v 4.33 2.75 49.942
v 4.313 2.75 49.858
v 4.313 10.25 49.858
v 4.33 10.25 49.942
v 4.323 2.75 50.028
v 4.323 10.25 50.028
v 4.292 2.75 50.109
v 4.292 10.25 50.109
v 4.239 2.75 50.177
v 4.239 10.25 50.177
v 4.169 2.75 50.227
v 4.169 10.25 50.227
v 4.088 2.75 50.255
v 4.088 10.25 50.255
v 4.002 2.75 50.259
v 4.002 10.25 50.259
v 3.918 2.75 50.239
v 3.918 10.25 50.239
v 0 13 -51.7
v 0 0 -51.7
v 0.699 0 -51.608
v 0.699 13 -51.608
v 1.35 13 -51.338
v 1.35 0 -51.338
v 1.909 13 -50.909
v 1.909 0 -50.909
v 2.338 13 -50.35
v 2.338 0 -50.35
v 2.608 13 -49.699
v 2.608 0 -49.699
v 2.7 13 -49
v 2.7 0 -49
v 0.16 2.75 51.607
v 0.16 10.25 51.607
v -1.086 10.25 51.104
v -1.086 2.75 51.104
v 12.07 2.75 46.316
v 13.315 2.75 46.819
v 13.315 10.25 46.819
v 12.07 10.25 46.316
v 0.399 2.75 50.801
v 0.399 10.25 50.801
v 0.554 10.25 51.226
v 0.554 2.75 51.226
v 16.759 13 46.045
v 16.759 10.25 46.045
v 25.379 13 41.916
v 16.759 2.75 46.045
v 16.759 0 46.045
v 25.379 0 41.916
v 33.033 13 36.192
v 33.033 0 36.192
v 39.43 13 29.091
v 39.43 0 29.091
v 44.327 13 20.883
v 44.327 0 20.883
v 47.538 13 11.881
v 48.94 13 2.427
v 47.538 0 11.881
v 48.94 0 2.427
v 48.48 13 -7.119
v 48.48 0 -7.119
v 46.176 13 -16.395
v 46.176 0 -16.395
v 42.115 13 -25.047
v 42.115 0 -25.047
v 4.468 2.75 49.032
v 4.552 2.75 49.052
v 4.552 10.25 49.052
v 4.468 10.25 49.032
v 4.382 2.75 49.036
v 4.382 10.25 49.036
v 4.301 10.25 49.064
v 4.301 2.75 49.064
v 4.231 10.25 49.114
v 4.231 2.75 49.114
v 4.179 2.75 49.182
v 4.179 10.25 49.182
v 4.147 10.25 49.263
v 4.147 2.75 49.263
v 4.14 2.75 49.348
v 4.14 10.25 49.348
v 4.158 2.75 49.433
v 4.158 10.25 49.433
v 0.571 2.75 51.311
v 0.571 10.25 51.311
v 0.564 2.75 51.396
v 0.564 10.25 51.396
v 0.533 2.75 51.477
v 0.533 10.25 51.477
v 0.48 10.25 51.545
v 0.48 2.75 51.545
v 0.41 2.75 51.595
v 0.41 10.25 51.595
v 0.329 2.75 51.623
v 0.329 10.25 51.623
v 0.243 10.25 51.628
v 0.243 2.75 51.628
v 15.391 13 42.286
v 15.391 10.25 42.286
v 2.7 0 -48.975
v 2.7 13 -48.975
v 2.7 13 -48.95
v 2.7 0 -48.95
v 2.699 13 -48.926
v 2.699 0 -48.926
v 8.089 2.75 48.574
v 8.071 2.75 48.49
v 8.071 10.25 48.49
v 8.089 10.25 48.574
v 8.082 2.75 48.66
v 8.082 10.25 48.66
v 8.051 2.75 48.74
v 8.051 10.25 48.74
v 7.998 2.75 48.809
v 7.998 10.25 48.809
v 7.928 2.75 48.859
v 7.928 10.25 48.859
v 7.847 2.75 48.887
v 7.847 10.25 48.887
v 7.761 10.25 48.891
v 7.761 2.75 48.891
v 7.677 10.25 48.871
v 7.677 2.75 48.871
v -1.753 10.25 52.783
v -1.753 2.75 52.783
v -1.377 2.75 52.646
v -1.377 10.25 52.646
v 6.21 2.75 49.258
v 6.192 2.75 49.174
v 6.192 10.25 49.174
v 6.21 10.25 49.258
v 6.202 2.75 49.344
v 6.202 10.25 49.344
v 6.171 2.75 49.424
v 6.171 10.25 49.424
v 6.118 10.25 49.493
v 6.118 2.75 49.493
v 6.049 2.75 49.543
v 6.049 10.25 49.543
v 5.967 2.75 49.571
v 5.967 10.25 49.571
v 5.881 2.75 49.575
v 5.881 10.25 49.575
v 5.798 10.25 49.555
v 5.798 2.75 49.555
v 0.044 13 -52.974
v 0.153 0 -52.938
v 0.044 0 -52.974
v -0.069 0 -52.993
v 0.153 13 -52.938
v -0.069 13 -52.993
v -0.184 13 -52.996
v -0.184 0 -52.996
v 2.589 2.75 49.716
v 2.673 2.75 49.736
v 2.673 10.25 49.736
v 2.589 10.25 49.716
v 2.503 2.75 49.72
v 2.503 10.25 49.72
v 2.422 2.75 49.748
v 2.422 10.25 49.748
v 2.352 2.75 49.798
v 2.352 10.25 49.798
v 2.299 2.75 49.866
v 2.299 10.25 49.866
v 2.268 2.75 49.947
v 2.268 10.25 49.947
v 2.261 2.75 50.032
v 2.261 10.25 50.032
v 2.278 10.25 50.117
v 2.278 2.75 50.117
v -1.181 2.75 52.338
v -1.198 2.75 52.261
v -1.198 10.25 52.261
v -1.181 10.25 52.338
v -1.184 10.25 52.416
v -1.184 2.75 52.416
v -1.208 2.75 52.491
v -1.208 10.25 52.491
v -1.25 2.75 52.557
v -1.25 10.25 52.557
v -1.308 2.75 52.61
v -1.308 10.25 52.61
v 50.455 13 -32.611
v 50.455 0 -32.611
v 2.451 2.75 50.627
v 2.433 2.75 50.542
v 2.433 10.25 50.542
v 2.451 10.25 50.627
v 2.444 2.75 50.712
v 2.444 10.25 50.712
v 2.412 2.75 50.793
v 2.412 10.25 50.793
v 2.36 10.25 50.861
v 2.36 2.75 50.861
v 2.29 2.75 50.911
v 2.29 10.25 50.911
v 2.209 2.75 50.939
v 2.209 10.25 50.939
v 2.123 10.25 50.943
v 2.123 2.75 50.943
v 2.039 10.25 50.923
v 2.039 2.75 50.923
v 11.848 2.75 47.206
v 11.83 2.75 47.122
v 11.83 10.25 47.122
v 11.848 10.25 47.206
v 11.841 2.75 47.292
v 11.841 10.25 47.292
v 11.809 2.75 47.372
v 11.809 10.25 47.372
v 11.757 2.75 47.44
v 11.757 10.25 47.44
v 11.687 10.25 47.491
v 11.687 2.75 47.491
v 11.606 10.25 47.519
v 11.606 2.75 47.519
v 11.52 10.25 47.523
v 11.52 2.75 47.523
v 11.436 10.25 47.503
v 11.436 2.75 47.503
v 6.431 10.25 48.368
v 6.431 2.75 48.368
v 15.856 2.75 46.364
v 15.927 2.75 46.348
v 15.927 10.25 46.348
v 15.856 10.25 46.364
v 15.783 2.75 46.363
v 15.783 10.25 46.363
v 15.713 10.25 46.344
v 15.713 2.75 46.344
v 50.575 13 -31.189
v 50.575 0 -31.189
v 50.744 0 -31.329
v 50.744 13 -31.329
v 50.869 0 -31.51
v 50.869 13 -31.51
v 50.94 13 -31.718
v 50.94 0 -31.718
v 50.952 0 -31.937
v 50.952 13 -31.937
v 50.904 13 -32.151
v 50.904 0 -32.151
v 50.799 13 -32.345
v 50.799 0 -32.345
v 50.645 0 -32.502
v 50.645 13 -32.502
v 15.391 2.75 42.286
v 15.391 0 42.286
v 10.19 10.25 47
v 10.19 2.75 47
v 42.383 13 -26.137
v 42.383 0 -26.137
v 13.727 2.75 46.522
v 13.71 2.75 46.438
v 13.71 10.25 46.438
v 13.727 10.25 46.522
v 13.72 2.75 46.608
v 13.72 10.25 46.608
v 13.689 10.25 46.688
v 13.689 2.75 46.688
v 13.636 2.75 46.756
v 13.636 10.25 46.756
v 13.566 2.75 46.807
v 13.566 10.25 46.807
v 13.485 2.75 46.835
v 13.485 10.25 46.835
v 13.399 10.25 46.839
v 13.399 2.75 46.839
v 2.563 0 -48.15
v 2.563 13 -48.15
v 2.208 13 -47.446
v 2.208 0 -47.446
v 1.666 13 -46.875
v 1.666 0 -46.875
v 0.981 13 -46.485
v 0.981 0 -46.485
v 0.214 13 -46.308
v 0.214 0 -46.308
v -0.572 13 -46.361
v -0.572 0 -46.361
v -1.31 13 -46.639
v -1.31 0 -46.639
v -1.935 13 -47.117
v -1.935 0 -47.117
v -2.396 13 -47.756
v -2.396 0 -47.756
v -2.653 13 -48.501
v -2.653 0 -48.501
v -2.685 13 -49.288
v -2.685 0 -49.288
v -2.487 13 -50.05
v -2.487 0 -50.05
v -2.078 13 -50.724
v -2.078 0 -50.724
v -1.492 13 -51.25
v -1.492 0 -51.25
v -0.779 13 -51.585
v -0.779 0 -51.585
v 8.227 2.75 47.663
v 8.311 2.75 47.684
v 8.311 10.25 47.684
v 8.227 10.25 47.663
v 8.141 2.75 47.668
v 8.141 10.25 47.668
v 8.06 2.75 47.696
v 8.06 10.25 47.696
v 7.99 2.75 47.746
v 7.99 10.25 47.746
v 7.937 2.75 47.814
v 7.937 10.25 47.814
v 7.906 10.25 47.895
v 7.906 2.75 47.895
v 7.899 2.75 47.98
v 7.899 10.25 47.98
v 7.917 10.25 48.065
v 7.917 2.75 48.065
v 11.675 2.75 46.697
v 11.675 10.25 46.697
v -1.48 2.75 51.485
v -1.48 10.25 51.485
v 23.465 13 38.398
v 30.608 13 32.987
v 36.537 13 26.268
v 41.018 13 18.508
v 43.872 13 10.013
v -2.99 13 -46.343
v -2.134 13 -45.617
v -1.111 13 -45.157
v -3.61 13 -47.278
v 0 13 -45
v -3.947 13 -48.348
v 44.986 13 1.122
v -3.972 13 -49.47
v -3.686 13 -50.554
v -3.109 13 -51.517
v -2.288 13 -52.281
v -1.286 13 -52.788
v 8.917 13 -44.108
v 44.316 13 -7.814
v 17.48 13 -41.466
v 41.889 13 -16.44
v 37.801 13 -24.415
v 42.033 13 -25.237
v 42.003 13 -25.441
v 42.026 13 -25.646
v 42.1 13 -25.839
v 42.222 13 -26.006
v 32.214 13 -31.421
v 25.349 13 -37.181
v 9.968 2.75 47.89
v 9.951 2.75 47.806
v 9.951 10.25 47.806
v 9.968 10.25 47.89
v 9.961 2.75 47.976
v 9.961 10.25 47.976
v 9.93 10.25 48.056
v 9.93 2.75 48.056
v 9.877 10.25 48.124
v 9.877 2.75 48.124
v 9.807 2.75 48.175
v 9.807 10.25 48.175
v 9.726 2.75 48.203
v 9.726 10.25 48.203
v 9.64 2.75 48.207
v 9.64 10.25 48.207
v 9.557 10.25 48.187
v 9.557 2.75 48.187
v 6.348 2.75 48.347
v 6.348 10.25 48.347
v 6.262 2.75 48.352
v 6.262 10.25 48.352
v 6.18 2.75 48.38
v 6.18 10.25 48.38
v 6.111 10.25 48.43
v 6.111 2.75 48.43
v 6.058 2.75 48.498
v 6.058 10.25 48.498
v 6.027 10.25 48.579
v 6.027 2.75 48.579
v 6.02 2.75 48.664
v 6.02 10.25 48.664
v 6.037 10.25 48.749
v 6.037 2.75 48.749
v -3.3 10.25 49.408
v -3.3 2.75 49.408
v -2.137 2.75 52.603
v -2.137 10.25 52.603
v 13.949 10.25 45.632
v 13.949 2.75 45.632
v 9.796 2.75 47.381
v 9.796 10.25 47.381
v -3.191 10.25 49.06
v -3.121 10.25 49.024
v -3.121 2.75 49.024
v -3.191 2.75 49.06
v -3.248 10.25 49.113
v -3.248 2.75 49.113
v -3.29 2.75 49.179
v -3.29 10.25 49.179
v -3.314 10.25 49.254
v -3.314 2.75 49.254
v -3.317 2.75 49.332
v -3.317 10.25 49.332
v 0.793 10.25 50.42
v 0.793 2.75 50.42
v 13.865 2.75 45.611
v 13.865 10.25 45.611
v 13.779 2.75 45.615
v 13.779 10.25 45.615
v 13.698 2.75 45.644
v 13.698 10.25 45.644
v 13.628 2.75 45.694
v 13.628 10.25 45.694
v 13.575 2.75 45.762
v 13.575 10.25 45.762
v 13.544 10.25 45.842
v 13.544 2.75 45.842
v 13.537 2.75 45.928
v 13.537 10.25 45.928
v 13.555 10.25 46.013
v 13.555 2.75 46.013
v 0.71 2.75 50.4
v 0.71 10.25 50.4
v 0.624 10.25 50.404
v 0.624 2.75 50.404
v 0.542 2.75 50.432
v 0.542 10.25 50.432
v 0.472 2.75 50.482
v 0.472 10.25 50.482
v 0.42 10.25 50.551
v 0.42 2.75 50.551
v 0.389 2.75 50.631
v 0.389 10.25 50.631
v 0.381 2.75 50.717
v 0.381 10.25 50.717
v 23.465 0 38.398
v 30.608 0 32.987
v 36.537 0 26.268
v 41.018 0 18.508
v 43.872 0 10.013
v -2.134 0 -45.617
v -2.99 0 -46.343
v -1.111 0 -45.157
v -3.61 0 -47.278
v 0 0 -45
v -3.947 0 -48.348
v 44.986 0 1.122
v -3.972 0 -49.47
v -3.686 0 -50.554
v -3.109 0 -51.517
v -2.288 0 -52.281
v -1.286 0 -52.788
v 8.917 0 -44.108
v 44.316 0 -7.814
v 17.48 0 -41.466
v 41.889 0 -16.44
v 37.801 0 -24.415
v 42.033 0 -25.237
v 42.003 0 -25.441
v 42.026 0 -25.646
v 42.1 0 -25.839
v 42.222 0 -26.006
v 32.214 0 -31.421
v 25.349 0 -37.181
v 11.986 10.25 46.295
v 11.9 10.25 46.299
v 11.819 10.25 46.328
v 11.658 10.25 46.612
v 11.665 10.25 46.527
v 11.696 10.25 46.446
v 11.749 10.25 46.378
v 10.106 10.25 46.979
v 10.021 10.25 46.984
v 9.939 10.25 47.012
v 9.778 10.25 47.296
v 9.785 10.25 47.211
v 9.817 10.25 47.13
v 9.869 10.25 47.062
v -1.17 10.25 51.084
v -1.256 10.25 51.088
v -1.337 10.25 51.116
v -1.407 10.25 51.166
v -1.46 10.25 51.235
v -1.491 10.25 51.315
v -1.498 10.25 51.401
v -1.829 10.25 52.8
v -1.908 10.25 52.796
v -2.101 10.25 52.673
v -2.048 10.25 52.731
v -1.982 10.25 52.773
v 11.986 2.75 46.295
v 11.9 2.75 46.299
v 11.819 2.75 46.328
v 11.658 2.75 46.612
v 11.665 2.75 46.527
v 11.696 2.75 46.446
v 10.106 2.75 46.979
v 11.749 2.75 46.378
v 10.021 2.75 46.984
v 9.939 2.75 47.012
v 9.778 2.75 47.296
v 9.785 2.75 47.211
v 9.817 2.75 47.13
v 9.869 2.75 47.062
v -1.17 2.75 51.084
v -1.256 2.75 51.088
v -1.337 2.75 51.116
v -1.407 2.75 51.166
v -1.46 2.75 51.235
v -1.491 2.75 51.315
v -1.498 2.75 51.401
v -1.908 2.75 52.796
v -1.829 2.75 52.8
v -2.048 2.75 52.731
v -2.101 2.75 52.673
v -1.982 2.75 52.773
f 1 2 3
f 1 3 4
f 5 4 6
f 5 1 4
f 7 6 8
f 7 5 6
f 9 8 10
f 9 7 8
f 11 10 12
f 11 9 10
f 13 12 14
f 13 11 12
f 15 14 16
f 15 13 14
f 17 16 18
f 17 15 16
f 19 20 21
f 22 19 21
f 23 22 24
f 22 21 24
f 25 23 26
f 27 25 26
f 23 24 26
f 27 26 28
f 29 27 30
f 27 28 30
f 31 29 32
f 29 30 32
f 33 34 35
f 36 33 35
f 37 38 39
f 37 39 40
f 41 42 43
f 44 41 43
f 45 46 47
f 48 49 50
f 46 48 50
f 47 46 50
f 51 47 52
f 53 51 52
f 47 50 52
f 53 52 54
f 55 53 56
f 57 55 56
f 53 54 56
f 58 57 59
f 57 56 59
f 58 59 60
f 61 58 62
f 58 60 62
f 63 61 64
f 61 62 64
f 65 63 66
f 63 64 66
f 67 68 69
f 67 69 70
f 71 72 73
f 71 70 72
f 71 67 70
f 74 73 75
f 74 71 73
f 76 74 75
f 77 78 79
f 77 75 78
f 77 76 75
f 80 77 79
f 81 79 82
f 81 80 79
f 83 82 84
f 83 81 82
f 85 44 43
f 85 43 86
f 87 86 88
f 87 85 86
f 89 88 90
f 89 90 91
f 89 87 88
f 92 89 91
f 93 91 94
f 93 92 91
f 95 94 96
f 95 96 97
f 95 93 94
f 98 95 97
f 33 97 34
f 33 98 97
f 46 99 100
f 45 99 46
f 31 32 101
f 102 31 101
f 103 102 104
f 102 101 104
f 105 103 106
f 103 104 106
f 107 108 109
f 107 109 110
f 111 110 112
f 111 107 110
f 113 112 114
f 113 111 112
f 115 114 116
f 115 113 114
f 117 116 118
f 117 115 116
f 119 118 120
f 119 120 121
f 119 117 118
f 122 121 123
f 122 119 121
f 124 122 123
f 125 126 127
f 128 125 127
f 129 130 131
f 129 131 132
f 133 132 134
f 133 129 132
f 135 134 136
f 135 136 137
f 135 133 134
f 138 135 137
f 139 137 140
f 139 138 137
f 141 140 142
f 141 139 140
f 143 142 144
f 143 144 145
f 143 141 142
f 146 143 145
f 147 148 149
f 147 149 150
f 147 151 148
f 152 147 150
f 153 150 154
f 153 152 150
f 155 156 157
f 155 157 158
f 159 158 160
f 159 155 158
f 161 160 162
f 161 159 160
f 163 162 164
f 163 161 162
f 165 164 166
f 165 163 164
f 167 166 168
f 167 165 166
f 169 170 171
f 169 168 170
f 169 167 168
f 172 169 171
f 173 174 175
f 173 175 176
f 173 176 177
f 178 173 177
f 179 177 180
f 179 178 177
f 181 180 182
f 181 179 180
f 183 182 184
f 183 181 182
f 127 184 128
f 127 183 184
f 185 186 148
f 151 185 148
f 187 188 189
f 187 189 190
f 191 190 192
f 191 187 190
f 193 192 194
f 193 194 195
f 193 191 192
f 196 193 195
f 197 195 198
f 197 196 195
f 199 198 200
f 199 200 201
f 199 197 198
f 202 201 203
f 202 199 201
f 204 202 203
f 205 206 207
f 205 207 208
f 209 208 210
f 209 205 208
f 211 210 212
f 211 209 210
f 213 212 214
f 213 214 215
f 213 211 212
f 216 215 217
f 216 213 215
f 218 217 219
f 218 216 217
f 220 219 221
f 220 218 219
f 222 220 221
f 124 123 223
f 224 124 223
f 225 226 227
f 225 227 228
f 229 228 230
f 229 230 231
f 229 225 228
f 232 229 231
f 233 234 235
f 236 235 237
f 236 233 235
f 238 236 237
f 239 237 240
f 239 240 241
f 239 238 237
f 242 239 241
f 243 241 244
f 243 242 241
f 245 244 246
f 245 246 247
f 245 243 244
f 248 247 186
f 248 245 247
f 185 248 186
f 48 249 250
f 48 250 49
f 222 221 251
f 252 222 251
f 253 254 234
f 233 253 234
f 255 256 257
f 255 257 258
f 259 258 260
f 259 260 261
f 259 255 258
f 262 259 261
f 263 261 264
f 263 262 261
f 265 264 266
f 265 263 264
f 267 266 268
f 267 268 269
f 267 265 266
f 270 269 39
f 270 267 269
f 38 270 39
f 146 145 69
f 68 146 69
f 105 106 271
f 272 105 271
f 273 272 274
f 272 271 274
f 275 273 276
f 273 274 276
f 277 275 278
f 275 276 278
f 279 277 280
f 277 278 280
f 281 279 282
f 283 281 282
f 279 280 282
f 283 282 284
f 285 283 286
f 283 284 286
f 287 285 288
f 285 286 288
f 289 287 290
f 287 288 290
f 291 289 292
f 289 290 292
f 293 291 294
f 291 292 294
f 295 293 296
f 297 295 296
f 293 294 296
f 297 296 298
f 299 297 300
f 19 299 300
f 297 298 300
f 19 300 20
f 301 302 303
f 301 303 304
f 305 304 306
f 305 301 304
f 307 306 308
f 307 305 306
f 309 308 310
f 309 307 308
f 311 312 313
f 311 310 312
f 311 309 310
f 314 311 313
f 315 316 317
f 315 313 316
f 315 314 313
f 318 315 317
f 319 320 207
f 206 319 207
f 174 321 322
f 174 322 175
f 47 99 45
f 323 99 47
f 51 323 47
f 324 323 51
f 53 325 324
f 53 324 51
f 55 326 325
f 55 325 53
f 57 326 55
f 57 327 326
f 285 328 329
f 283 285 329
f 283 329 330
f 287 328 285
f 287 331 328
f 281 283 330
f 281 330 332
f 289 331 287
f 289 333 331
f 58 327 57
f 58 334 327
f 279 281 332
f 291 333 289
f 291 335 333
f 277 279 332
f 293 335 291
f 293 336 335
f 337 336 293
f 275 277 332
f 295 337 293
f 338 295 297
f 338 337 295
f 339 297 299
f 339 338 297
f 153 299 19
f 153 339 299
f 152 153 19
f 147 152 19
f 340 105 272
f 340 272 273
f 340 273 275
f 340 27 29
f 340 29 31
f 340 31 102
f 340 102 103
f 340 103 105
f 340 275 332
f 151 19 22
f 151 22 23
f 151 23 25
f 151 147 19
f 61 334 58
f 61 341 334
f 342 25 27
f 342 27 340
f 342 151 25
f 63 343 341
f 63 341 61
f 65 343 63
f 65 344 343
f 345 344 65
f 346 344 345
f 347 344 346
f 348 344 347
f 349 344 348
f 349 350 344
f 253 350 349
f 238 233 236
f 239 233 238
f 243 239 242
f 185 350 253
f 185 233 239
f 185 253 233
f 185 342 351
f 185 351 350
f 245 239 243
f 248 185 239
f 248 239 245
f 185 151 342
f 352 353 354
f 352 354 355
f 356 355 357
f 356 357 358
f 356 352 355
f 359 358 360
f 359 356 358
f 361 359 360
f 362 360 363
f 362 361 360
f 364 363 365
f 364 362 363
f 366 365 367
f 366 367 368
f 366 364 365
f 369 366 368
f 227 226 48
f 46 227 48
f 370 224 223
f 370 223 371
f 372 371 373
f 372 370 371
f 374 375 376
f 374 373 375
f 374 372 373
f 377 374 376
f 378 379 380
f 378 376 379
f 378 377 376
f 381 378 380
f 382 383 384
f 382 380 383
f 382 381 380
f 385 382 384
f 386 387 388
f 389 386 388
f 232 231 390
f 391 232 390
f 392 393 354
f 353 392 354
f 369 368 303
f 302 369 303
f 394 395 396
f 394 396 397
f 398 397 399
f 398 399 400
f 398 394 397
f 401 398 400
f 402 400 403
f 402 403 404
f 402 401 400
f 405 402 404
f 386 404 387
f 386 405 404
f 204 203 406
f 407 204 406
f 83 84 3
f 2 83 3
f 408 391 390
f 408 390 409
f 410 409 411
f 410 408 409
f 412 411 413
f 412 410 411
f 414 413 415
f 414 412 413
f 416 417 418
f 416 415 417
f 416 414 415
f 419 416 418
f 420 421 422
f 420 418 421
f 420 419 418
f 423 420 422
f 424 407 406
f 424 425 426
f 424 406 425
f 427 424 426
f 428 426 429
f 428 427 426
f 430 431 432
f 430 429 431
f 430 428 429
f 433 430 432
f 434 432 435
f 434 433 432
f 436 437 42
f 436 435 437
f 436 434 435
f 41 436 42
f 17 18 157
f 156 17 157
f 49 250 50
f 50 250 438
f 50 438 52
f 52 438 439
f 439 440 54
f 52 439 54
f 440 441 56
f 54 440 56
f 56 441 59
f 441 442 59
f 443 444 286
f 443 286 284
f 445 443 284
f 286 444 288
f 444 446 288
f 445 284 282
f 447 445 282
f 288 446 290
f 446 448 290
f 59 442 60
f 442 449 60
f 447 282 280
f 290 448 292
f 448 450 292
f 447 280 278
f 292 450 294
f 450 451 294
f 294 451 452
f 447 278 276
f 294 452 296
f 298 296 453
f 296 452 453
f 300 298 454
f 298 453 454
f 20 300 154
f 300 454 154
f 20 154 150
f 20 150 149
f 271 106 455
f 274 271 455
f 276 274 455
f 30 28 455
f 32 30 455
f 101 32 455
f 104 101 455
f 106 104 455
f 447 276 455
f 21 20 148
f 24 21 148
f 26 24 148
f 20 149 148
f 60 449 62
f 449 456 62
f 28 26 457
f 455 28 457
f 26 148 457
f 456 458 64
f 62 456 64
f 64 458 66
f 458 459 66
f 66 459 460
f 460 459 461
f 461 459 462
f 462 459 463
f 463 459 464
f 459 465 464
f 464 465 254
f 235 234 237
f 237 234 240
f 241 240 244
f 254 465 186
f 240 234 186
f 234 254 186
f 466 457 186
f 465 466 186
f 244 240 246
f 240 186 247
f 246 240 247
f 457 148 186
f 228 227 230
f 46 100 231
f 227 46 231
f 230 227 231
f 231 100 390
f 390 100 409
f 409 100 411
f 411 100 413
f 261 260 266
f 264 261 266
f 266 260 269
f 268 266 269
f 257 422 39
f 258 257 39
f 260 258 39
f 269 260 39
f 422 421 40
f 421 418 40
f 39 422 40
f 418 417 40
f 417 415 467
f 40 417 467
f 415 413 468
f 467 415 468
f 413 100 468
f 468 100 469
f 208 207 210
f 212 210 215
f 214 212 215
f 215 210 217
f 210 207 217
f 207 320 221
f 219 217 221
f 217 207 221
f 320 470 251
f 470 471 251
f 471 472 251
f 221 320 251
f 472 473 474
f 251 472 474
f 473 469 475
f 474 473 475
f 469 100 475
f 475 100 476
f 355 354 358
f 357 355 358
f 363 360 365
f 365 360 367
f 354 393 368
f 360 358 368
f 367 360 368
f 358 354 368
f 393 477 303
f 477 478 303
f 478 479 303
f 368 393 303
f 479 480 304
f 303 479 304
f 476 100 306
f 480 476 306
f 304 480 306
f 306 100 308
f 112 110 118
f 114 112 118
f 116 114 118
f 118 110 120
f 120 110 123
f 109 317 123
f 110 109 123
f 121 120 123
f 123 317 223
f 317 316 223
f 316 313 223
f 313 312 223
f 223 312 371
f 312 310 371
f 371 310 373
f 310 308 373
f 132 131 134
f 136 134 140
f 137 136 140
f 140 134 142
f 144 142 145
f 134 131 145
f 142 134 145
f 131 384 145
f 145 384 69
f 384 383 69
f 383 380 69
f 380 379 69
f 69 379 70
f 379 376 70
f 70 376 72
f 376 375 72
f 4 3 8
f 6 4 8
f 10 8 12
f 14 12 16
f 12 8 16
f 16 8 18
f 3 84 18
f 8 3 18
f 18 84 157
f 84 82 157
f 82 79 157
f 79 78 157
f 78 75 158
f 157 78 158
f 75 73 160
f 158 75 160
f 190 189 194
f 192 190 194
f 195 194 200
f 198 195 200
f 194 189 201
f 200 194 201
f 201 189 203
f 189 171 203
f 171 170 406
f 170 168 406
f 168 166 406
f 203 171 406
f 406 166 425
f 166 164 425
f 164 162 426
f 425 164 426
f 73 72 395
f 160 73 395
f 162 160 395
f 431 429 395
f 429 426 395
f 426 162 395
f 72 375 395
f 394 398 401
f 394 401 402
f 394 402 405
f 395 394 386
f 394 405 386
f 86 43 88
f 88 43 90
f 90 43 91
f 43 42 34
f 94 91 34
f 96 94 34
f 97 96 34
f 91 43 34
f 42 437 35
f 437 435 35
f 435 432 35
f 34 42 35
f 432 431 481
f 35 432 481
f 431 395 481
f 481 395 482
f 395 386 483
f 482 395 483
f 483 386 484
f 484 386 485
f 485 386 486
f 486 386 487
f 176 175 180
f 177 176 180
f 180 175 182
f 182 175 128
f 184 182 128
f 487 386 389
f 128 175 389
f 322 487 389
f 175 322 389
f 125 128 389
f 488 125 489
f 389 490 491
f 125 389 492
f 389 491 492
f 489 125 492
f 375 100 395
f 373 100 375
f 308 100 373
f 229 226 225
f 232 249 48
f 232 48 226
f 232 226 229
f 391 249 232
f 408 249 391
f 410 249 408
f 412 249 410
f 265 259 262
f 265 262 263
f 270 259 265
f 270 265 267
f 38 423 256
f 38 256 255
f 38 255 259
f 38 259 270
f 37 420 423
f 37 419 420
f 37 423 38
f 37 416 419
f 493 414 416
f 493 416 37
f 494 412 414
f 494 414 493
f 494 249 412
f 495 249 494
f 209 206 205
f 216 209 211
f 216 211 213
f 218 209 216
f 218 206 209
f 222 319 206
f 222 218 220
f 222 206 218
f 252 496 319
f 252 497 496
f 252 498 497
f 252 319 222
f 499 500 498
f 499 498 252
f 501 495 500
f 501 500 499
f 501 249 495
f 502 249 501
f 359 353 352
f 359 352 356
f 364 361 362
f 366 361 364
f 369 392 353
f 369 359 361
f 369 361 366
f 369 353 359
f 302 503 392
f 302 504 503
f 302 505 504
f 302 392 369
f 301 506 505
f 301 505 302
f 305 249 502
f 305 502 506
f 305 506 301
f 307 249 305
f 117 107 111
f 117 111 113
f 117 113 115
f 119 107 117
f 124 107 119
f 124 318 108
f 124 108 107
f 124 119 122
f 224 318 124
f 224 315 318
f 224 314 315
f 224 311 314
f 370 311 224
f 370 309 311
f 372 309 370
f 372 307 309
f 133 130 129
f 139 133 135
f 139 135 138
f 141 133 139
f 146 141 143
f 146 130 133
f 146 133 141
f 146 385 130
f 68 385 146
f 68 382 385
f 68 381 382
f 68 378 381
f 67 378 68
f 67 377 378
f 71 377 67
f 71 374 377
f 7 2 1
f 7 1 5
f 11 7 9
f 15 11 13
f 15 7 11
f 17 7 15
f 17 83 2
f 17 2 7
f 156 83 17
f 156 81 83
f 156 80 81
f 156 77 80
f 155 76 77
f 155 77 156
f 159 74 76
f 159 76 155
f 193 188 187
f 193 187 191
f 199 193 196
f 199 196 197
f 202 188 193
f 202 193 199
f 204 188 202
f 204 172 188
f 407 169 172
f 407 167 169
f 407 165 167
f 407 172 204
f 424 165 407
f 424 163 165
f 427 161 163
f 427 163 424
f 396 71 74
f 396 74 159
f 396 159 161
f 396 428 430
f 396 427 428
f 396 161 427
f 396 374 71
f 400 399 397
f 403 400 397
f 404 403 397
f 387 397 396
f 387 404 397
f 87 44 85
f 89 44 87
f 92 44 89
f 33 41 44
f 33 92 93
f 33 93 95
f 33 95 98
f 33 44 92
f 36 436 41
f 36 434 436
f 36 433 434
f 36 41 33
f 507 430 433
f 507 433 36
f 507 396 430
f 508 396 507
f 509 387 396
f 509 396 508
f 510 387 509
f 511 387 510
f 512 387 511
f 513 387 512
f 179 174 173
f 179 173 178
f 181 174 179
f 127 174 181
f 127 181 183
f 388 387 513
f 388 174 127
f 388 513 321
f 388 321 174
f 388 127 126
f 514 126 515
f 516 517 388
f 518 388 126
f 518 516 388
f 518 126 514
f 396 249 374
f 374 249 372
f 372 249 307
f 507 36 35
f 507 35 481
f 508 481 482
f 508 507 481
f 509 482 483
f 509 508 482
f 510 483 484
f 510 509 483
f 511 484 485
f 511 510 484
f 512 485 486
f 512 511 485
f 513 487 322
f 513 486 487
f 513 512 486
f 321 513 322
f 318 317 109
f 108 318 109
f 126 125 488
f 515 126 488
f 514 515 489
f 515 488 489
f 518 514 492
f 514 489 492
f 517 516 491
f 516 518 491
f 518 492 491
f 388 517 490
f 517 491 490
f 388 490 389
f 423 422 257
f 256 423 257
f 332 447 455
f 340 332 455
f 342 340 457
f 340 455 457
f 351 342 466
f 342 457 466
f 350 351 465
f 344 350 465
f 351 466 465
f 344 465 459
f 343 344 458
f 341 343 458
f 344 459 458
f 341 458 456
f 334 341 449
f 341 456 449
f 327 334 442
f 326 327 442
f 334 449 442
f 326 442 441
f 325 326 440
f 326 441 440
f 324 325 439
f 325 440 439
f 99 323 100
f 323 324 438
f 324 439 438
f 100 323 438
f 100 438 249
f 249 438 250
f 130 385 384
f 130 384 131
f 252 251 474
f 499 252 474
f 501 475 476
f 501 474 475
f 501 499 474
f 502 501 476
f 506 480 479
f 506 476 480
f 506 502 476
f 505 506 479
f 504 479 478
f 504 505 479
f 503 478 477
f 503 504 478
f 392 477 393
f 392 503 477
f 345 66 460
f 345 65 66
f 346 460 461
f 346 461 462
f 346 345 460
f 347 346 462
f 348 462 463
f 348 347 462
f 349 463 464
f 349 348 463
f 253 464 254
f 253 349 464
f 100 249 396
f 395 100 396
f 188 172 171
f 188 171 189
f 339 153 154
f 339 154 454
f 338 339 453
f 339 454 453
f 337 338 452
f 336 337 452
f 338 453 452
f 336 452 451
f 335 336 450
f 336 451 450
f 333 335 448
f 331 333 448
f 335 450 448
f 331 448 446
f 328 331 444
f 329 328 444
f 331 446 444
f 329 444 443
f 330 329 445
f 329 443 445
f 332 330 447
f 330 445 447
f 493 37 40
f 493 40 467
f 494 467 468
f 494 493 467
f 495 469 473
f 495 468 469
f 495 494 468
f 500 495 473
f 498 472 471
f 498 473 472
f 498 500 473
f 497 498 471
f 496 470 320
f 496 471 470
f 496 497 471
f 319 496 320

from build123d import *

# Parameters (mm, degrees)
BOSS_EXTRUDE1_DEPTH = 13
CUT_EXTRUDE1_DEPTH  = 20
FILLET2_R           = 0.3
FILLET1_R           = 0.8
SKETCH3_OUTSIDE_W   = 144.199
SKETCH3_OUTSIDE_H   = 38.986
SKETCH3_OUTSIDE_W_2 = 5.910380326
SKETCH3_OUTSIDE_H_2 = 7.5
CUT_EXTRUDE2_DEPTH  = 20


with BuildPart() as part:
    # Sketch1 → Boss-Extrude1 (new body)
    with BuildSketch(Plane(origin=(0, 0, 0), x_dir=(1, 0, 0), z_dir=(0, 1, 0))):
        with BuildLine():
            Line((0, 51.7), (0, 53))
            ThreePointArc((0, 53), (-4, 49), (0, 45))
            ThreePointArc((0, 45), (44.316348886, 7.814167995), (15.39090645, -42.286167935))
            Line((15.39090645, -42.286167935), (-3.402945966, -49.126570802))
            Line((-3.402945966, -49.126570802), (-2.034865393, -52.885341285))
            Line((-2.034865393, -52.885341285), (16.758987023, -46.044938419))
            ThreePointArc((16.758987023, -46.044938419), (46.283080581, -16.089638031), (41.707047143, 25.720074234))
            ThreePointArc((41.707047143, 25.720074234), (25.051905135, 42.111780407), (2.698975076, 48.925612245))
            ThreePointArc((2.698975076, 48.925612245), (-1.935309657, 47.117295421), (0, 51.7))
        make_face()
        with BuildLine():
            Line((51.921017872, 32.018867925), (0, 53))
            Line((0, 53), (0, 51.7))
            ThreePointArc((0, 51.7), (1.909188309, 50.909188309), (2.7, 49))
            ThreePointArc((2.7, 49), (2.699743757, 48.962802592), (2.698975076, 48.925612245))
            ThreePointArc((2.698975076, 48.925612245), (25.051905135, 42.111780407), (41.707047143, 25.720074234))
            Line((41.707047143, 25.720074234), (51.921017872, 32.018867925))
        make_face()
    extrude(amount=BOSS_EXTRUDE1_DEPTH)

    # Sketch2 → Cut-Extrude1 (cut)
    with BuildSketch(Plane(origin=(0, 13, 0), x_dir=(1, 0, 0), z_dir=(0, 1, 0))):
        Polygon((-1.71080903, -50.851874424), (-1.095172772, -52.543321142), (0.78421247, -51.859280855), align=None)
        Polygon((0.168576212, -50.167834138), (0.78421247, -51.859280855), (2.663597711, -51.175240568), align=None)
        Polygon((2.047961453, -49.483793851), (2.663597711, -51.175240568), (4.542982953, -50.491200282), align=None)
        Polygon((3.927346695, -48.799753564), (4.542982953, -50.491200282), (6.422368194, -49.807159995), align=None)
        Polygon((5.806731936, -48.115713278), (6.422368194, -49.807159995), (8.301753436, -49.123119708), align=None)
        Polygon((7.686117178, -47.431672991), (8.301753436, -49.123119708), (10.181138677, -48.439079422), align=None)
        Polygon((9.565502419, -46.747632704), (10.181138677, -48.439079422), (12.060523919, -47.755039135), align=None)
        Polygon((11.444887661, -46.063592418), (12.060523919, -47.755039135), (13.939909161, -47.070998848), align=None)
        Polygon((13.324272903, -45.379552131), (13.939909161, -47.070998848), (15.819294402, -46.386958562), align=None)
    extrude(amount=-CUT_EXTRUDE1_DEPTH, mode=Mode.SUBTRACT)

    # Fillet2
    fillet2_edges = [part.edges().sort_by_distance(p)[0] for p in [
        (0.168576212, 6.5, 50.167834138),
        (3.927346695, 6.5, 48.799753564),
        (7.686117178, 6.5, 47.431672991),
        (11.444887661, 6.5, 46.063592418),
        (-2.034865393, 6.5, 52.885341285),
        (-3.402945966, 6.5, 49.126570802),
        (-1.71080903, 6.5, 50.851874424),
        (0.78421247, 6.5, 51.859280855),
        (-1.095172772, 6.5, 52.543321142),
        (2.047961453, 6.5, 49.483793851),
        (4.542982953, 6.5, 50.491200282),
        (2.663597711, 6.5, 51.175240568),
        (5.806731936, 6.5, 48.115713278),
        (8.301753436, 6.5, 49.123119708),
        (6.422368194, 6.5, 49.807159995),
        (9.565502419, 6.5, 46.747632704),
        (12.060523919, 6.5, 47.755039135),
        (10.181138677, 6.5, 48.439079422),
        (13.324272903, 6.5, 45.379552131),
        (15.819294402, 6.5, 46.386958562),
        (13.939909161, 6.5, 47.070998848),
    ]]
    fillet(fillet2_edges, radius=FILLET2_R)

    # Fillet1
    fillet1_edges = [part.edges().sort_by_distance(p)[0] for p in [
        (51.921017872, 6.5, -32.018867925),
        (41.707047143, 6.5, -25.720074234),
        (0, 6.5, -53),
    ]]
    fillet(fillet1_edges, radius=FILLET1_R)

    # Sketch3 outside → Cut-Extrude2 (cut)
    with BuildSketch(Plane(origin=(-18.793852416, 0, 6.840402867), x_dir=(0.342020143, 0, 0.939692621), z_dir=(-0.939692621, 0, 0.342020143))):
        with Locations((7.9375, 6.5)):
            Rectangle(SKETCH3_OUTSIDE_W, SKETCH3_OUTSIDE_H)
        with Locations((47.141631591, 6.5)):
            Rectangle(SKETCH3_OUTSIDE_W_2, SKETCH3_OUTSIDE_H_2, mode=Mode.SUBTRACT)
    extrude(amount=-CUT_EXTRUDE2_DEPTH, mode=Mode.SUBTRACT)


solid = part.part
